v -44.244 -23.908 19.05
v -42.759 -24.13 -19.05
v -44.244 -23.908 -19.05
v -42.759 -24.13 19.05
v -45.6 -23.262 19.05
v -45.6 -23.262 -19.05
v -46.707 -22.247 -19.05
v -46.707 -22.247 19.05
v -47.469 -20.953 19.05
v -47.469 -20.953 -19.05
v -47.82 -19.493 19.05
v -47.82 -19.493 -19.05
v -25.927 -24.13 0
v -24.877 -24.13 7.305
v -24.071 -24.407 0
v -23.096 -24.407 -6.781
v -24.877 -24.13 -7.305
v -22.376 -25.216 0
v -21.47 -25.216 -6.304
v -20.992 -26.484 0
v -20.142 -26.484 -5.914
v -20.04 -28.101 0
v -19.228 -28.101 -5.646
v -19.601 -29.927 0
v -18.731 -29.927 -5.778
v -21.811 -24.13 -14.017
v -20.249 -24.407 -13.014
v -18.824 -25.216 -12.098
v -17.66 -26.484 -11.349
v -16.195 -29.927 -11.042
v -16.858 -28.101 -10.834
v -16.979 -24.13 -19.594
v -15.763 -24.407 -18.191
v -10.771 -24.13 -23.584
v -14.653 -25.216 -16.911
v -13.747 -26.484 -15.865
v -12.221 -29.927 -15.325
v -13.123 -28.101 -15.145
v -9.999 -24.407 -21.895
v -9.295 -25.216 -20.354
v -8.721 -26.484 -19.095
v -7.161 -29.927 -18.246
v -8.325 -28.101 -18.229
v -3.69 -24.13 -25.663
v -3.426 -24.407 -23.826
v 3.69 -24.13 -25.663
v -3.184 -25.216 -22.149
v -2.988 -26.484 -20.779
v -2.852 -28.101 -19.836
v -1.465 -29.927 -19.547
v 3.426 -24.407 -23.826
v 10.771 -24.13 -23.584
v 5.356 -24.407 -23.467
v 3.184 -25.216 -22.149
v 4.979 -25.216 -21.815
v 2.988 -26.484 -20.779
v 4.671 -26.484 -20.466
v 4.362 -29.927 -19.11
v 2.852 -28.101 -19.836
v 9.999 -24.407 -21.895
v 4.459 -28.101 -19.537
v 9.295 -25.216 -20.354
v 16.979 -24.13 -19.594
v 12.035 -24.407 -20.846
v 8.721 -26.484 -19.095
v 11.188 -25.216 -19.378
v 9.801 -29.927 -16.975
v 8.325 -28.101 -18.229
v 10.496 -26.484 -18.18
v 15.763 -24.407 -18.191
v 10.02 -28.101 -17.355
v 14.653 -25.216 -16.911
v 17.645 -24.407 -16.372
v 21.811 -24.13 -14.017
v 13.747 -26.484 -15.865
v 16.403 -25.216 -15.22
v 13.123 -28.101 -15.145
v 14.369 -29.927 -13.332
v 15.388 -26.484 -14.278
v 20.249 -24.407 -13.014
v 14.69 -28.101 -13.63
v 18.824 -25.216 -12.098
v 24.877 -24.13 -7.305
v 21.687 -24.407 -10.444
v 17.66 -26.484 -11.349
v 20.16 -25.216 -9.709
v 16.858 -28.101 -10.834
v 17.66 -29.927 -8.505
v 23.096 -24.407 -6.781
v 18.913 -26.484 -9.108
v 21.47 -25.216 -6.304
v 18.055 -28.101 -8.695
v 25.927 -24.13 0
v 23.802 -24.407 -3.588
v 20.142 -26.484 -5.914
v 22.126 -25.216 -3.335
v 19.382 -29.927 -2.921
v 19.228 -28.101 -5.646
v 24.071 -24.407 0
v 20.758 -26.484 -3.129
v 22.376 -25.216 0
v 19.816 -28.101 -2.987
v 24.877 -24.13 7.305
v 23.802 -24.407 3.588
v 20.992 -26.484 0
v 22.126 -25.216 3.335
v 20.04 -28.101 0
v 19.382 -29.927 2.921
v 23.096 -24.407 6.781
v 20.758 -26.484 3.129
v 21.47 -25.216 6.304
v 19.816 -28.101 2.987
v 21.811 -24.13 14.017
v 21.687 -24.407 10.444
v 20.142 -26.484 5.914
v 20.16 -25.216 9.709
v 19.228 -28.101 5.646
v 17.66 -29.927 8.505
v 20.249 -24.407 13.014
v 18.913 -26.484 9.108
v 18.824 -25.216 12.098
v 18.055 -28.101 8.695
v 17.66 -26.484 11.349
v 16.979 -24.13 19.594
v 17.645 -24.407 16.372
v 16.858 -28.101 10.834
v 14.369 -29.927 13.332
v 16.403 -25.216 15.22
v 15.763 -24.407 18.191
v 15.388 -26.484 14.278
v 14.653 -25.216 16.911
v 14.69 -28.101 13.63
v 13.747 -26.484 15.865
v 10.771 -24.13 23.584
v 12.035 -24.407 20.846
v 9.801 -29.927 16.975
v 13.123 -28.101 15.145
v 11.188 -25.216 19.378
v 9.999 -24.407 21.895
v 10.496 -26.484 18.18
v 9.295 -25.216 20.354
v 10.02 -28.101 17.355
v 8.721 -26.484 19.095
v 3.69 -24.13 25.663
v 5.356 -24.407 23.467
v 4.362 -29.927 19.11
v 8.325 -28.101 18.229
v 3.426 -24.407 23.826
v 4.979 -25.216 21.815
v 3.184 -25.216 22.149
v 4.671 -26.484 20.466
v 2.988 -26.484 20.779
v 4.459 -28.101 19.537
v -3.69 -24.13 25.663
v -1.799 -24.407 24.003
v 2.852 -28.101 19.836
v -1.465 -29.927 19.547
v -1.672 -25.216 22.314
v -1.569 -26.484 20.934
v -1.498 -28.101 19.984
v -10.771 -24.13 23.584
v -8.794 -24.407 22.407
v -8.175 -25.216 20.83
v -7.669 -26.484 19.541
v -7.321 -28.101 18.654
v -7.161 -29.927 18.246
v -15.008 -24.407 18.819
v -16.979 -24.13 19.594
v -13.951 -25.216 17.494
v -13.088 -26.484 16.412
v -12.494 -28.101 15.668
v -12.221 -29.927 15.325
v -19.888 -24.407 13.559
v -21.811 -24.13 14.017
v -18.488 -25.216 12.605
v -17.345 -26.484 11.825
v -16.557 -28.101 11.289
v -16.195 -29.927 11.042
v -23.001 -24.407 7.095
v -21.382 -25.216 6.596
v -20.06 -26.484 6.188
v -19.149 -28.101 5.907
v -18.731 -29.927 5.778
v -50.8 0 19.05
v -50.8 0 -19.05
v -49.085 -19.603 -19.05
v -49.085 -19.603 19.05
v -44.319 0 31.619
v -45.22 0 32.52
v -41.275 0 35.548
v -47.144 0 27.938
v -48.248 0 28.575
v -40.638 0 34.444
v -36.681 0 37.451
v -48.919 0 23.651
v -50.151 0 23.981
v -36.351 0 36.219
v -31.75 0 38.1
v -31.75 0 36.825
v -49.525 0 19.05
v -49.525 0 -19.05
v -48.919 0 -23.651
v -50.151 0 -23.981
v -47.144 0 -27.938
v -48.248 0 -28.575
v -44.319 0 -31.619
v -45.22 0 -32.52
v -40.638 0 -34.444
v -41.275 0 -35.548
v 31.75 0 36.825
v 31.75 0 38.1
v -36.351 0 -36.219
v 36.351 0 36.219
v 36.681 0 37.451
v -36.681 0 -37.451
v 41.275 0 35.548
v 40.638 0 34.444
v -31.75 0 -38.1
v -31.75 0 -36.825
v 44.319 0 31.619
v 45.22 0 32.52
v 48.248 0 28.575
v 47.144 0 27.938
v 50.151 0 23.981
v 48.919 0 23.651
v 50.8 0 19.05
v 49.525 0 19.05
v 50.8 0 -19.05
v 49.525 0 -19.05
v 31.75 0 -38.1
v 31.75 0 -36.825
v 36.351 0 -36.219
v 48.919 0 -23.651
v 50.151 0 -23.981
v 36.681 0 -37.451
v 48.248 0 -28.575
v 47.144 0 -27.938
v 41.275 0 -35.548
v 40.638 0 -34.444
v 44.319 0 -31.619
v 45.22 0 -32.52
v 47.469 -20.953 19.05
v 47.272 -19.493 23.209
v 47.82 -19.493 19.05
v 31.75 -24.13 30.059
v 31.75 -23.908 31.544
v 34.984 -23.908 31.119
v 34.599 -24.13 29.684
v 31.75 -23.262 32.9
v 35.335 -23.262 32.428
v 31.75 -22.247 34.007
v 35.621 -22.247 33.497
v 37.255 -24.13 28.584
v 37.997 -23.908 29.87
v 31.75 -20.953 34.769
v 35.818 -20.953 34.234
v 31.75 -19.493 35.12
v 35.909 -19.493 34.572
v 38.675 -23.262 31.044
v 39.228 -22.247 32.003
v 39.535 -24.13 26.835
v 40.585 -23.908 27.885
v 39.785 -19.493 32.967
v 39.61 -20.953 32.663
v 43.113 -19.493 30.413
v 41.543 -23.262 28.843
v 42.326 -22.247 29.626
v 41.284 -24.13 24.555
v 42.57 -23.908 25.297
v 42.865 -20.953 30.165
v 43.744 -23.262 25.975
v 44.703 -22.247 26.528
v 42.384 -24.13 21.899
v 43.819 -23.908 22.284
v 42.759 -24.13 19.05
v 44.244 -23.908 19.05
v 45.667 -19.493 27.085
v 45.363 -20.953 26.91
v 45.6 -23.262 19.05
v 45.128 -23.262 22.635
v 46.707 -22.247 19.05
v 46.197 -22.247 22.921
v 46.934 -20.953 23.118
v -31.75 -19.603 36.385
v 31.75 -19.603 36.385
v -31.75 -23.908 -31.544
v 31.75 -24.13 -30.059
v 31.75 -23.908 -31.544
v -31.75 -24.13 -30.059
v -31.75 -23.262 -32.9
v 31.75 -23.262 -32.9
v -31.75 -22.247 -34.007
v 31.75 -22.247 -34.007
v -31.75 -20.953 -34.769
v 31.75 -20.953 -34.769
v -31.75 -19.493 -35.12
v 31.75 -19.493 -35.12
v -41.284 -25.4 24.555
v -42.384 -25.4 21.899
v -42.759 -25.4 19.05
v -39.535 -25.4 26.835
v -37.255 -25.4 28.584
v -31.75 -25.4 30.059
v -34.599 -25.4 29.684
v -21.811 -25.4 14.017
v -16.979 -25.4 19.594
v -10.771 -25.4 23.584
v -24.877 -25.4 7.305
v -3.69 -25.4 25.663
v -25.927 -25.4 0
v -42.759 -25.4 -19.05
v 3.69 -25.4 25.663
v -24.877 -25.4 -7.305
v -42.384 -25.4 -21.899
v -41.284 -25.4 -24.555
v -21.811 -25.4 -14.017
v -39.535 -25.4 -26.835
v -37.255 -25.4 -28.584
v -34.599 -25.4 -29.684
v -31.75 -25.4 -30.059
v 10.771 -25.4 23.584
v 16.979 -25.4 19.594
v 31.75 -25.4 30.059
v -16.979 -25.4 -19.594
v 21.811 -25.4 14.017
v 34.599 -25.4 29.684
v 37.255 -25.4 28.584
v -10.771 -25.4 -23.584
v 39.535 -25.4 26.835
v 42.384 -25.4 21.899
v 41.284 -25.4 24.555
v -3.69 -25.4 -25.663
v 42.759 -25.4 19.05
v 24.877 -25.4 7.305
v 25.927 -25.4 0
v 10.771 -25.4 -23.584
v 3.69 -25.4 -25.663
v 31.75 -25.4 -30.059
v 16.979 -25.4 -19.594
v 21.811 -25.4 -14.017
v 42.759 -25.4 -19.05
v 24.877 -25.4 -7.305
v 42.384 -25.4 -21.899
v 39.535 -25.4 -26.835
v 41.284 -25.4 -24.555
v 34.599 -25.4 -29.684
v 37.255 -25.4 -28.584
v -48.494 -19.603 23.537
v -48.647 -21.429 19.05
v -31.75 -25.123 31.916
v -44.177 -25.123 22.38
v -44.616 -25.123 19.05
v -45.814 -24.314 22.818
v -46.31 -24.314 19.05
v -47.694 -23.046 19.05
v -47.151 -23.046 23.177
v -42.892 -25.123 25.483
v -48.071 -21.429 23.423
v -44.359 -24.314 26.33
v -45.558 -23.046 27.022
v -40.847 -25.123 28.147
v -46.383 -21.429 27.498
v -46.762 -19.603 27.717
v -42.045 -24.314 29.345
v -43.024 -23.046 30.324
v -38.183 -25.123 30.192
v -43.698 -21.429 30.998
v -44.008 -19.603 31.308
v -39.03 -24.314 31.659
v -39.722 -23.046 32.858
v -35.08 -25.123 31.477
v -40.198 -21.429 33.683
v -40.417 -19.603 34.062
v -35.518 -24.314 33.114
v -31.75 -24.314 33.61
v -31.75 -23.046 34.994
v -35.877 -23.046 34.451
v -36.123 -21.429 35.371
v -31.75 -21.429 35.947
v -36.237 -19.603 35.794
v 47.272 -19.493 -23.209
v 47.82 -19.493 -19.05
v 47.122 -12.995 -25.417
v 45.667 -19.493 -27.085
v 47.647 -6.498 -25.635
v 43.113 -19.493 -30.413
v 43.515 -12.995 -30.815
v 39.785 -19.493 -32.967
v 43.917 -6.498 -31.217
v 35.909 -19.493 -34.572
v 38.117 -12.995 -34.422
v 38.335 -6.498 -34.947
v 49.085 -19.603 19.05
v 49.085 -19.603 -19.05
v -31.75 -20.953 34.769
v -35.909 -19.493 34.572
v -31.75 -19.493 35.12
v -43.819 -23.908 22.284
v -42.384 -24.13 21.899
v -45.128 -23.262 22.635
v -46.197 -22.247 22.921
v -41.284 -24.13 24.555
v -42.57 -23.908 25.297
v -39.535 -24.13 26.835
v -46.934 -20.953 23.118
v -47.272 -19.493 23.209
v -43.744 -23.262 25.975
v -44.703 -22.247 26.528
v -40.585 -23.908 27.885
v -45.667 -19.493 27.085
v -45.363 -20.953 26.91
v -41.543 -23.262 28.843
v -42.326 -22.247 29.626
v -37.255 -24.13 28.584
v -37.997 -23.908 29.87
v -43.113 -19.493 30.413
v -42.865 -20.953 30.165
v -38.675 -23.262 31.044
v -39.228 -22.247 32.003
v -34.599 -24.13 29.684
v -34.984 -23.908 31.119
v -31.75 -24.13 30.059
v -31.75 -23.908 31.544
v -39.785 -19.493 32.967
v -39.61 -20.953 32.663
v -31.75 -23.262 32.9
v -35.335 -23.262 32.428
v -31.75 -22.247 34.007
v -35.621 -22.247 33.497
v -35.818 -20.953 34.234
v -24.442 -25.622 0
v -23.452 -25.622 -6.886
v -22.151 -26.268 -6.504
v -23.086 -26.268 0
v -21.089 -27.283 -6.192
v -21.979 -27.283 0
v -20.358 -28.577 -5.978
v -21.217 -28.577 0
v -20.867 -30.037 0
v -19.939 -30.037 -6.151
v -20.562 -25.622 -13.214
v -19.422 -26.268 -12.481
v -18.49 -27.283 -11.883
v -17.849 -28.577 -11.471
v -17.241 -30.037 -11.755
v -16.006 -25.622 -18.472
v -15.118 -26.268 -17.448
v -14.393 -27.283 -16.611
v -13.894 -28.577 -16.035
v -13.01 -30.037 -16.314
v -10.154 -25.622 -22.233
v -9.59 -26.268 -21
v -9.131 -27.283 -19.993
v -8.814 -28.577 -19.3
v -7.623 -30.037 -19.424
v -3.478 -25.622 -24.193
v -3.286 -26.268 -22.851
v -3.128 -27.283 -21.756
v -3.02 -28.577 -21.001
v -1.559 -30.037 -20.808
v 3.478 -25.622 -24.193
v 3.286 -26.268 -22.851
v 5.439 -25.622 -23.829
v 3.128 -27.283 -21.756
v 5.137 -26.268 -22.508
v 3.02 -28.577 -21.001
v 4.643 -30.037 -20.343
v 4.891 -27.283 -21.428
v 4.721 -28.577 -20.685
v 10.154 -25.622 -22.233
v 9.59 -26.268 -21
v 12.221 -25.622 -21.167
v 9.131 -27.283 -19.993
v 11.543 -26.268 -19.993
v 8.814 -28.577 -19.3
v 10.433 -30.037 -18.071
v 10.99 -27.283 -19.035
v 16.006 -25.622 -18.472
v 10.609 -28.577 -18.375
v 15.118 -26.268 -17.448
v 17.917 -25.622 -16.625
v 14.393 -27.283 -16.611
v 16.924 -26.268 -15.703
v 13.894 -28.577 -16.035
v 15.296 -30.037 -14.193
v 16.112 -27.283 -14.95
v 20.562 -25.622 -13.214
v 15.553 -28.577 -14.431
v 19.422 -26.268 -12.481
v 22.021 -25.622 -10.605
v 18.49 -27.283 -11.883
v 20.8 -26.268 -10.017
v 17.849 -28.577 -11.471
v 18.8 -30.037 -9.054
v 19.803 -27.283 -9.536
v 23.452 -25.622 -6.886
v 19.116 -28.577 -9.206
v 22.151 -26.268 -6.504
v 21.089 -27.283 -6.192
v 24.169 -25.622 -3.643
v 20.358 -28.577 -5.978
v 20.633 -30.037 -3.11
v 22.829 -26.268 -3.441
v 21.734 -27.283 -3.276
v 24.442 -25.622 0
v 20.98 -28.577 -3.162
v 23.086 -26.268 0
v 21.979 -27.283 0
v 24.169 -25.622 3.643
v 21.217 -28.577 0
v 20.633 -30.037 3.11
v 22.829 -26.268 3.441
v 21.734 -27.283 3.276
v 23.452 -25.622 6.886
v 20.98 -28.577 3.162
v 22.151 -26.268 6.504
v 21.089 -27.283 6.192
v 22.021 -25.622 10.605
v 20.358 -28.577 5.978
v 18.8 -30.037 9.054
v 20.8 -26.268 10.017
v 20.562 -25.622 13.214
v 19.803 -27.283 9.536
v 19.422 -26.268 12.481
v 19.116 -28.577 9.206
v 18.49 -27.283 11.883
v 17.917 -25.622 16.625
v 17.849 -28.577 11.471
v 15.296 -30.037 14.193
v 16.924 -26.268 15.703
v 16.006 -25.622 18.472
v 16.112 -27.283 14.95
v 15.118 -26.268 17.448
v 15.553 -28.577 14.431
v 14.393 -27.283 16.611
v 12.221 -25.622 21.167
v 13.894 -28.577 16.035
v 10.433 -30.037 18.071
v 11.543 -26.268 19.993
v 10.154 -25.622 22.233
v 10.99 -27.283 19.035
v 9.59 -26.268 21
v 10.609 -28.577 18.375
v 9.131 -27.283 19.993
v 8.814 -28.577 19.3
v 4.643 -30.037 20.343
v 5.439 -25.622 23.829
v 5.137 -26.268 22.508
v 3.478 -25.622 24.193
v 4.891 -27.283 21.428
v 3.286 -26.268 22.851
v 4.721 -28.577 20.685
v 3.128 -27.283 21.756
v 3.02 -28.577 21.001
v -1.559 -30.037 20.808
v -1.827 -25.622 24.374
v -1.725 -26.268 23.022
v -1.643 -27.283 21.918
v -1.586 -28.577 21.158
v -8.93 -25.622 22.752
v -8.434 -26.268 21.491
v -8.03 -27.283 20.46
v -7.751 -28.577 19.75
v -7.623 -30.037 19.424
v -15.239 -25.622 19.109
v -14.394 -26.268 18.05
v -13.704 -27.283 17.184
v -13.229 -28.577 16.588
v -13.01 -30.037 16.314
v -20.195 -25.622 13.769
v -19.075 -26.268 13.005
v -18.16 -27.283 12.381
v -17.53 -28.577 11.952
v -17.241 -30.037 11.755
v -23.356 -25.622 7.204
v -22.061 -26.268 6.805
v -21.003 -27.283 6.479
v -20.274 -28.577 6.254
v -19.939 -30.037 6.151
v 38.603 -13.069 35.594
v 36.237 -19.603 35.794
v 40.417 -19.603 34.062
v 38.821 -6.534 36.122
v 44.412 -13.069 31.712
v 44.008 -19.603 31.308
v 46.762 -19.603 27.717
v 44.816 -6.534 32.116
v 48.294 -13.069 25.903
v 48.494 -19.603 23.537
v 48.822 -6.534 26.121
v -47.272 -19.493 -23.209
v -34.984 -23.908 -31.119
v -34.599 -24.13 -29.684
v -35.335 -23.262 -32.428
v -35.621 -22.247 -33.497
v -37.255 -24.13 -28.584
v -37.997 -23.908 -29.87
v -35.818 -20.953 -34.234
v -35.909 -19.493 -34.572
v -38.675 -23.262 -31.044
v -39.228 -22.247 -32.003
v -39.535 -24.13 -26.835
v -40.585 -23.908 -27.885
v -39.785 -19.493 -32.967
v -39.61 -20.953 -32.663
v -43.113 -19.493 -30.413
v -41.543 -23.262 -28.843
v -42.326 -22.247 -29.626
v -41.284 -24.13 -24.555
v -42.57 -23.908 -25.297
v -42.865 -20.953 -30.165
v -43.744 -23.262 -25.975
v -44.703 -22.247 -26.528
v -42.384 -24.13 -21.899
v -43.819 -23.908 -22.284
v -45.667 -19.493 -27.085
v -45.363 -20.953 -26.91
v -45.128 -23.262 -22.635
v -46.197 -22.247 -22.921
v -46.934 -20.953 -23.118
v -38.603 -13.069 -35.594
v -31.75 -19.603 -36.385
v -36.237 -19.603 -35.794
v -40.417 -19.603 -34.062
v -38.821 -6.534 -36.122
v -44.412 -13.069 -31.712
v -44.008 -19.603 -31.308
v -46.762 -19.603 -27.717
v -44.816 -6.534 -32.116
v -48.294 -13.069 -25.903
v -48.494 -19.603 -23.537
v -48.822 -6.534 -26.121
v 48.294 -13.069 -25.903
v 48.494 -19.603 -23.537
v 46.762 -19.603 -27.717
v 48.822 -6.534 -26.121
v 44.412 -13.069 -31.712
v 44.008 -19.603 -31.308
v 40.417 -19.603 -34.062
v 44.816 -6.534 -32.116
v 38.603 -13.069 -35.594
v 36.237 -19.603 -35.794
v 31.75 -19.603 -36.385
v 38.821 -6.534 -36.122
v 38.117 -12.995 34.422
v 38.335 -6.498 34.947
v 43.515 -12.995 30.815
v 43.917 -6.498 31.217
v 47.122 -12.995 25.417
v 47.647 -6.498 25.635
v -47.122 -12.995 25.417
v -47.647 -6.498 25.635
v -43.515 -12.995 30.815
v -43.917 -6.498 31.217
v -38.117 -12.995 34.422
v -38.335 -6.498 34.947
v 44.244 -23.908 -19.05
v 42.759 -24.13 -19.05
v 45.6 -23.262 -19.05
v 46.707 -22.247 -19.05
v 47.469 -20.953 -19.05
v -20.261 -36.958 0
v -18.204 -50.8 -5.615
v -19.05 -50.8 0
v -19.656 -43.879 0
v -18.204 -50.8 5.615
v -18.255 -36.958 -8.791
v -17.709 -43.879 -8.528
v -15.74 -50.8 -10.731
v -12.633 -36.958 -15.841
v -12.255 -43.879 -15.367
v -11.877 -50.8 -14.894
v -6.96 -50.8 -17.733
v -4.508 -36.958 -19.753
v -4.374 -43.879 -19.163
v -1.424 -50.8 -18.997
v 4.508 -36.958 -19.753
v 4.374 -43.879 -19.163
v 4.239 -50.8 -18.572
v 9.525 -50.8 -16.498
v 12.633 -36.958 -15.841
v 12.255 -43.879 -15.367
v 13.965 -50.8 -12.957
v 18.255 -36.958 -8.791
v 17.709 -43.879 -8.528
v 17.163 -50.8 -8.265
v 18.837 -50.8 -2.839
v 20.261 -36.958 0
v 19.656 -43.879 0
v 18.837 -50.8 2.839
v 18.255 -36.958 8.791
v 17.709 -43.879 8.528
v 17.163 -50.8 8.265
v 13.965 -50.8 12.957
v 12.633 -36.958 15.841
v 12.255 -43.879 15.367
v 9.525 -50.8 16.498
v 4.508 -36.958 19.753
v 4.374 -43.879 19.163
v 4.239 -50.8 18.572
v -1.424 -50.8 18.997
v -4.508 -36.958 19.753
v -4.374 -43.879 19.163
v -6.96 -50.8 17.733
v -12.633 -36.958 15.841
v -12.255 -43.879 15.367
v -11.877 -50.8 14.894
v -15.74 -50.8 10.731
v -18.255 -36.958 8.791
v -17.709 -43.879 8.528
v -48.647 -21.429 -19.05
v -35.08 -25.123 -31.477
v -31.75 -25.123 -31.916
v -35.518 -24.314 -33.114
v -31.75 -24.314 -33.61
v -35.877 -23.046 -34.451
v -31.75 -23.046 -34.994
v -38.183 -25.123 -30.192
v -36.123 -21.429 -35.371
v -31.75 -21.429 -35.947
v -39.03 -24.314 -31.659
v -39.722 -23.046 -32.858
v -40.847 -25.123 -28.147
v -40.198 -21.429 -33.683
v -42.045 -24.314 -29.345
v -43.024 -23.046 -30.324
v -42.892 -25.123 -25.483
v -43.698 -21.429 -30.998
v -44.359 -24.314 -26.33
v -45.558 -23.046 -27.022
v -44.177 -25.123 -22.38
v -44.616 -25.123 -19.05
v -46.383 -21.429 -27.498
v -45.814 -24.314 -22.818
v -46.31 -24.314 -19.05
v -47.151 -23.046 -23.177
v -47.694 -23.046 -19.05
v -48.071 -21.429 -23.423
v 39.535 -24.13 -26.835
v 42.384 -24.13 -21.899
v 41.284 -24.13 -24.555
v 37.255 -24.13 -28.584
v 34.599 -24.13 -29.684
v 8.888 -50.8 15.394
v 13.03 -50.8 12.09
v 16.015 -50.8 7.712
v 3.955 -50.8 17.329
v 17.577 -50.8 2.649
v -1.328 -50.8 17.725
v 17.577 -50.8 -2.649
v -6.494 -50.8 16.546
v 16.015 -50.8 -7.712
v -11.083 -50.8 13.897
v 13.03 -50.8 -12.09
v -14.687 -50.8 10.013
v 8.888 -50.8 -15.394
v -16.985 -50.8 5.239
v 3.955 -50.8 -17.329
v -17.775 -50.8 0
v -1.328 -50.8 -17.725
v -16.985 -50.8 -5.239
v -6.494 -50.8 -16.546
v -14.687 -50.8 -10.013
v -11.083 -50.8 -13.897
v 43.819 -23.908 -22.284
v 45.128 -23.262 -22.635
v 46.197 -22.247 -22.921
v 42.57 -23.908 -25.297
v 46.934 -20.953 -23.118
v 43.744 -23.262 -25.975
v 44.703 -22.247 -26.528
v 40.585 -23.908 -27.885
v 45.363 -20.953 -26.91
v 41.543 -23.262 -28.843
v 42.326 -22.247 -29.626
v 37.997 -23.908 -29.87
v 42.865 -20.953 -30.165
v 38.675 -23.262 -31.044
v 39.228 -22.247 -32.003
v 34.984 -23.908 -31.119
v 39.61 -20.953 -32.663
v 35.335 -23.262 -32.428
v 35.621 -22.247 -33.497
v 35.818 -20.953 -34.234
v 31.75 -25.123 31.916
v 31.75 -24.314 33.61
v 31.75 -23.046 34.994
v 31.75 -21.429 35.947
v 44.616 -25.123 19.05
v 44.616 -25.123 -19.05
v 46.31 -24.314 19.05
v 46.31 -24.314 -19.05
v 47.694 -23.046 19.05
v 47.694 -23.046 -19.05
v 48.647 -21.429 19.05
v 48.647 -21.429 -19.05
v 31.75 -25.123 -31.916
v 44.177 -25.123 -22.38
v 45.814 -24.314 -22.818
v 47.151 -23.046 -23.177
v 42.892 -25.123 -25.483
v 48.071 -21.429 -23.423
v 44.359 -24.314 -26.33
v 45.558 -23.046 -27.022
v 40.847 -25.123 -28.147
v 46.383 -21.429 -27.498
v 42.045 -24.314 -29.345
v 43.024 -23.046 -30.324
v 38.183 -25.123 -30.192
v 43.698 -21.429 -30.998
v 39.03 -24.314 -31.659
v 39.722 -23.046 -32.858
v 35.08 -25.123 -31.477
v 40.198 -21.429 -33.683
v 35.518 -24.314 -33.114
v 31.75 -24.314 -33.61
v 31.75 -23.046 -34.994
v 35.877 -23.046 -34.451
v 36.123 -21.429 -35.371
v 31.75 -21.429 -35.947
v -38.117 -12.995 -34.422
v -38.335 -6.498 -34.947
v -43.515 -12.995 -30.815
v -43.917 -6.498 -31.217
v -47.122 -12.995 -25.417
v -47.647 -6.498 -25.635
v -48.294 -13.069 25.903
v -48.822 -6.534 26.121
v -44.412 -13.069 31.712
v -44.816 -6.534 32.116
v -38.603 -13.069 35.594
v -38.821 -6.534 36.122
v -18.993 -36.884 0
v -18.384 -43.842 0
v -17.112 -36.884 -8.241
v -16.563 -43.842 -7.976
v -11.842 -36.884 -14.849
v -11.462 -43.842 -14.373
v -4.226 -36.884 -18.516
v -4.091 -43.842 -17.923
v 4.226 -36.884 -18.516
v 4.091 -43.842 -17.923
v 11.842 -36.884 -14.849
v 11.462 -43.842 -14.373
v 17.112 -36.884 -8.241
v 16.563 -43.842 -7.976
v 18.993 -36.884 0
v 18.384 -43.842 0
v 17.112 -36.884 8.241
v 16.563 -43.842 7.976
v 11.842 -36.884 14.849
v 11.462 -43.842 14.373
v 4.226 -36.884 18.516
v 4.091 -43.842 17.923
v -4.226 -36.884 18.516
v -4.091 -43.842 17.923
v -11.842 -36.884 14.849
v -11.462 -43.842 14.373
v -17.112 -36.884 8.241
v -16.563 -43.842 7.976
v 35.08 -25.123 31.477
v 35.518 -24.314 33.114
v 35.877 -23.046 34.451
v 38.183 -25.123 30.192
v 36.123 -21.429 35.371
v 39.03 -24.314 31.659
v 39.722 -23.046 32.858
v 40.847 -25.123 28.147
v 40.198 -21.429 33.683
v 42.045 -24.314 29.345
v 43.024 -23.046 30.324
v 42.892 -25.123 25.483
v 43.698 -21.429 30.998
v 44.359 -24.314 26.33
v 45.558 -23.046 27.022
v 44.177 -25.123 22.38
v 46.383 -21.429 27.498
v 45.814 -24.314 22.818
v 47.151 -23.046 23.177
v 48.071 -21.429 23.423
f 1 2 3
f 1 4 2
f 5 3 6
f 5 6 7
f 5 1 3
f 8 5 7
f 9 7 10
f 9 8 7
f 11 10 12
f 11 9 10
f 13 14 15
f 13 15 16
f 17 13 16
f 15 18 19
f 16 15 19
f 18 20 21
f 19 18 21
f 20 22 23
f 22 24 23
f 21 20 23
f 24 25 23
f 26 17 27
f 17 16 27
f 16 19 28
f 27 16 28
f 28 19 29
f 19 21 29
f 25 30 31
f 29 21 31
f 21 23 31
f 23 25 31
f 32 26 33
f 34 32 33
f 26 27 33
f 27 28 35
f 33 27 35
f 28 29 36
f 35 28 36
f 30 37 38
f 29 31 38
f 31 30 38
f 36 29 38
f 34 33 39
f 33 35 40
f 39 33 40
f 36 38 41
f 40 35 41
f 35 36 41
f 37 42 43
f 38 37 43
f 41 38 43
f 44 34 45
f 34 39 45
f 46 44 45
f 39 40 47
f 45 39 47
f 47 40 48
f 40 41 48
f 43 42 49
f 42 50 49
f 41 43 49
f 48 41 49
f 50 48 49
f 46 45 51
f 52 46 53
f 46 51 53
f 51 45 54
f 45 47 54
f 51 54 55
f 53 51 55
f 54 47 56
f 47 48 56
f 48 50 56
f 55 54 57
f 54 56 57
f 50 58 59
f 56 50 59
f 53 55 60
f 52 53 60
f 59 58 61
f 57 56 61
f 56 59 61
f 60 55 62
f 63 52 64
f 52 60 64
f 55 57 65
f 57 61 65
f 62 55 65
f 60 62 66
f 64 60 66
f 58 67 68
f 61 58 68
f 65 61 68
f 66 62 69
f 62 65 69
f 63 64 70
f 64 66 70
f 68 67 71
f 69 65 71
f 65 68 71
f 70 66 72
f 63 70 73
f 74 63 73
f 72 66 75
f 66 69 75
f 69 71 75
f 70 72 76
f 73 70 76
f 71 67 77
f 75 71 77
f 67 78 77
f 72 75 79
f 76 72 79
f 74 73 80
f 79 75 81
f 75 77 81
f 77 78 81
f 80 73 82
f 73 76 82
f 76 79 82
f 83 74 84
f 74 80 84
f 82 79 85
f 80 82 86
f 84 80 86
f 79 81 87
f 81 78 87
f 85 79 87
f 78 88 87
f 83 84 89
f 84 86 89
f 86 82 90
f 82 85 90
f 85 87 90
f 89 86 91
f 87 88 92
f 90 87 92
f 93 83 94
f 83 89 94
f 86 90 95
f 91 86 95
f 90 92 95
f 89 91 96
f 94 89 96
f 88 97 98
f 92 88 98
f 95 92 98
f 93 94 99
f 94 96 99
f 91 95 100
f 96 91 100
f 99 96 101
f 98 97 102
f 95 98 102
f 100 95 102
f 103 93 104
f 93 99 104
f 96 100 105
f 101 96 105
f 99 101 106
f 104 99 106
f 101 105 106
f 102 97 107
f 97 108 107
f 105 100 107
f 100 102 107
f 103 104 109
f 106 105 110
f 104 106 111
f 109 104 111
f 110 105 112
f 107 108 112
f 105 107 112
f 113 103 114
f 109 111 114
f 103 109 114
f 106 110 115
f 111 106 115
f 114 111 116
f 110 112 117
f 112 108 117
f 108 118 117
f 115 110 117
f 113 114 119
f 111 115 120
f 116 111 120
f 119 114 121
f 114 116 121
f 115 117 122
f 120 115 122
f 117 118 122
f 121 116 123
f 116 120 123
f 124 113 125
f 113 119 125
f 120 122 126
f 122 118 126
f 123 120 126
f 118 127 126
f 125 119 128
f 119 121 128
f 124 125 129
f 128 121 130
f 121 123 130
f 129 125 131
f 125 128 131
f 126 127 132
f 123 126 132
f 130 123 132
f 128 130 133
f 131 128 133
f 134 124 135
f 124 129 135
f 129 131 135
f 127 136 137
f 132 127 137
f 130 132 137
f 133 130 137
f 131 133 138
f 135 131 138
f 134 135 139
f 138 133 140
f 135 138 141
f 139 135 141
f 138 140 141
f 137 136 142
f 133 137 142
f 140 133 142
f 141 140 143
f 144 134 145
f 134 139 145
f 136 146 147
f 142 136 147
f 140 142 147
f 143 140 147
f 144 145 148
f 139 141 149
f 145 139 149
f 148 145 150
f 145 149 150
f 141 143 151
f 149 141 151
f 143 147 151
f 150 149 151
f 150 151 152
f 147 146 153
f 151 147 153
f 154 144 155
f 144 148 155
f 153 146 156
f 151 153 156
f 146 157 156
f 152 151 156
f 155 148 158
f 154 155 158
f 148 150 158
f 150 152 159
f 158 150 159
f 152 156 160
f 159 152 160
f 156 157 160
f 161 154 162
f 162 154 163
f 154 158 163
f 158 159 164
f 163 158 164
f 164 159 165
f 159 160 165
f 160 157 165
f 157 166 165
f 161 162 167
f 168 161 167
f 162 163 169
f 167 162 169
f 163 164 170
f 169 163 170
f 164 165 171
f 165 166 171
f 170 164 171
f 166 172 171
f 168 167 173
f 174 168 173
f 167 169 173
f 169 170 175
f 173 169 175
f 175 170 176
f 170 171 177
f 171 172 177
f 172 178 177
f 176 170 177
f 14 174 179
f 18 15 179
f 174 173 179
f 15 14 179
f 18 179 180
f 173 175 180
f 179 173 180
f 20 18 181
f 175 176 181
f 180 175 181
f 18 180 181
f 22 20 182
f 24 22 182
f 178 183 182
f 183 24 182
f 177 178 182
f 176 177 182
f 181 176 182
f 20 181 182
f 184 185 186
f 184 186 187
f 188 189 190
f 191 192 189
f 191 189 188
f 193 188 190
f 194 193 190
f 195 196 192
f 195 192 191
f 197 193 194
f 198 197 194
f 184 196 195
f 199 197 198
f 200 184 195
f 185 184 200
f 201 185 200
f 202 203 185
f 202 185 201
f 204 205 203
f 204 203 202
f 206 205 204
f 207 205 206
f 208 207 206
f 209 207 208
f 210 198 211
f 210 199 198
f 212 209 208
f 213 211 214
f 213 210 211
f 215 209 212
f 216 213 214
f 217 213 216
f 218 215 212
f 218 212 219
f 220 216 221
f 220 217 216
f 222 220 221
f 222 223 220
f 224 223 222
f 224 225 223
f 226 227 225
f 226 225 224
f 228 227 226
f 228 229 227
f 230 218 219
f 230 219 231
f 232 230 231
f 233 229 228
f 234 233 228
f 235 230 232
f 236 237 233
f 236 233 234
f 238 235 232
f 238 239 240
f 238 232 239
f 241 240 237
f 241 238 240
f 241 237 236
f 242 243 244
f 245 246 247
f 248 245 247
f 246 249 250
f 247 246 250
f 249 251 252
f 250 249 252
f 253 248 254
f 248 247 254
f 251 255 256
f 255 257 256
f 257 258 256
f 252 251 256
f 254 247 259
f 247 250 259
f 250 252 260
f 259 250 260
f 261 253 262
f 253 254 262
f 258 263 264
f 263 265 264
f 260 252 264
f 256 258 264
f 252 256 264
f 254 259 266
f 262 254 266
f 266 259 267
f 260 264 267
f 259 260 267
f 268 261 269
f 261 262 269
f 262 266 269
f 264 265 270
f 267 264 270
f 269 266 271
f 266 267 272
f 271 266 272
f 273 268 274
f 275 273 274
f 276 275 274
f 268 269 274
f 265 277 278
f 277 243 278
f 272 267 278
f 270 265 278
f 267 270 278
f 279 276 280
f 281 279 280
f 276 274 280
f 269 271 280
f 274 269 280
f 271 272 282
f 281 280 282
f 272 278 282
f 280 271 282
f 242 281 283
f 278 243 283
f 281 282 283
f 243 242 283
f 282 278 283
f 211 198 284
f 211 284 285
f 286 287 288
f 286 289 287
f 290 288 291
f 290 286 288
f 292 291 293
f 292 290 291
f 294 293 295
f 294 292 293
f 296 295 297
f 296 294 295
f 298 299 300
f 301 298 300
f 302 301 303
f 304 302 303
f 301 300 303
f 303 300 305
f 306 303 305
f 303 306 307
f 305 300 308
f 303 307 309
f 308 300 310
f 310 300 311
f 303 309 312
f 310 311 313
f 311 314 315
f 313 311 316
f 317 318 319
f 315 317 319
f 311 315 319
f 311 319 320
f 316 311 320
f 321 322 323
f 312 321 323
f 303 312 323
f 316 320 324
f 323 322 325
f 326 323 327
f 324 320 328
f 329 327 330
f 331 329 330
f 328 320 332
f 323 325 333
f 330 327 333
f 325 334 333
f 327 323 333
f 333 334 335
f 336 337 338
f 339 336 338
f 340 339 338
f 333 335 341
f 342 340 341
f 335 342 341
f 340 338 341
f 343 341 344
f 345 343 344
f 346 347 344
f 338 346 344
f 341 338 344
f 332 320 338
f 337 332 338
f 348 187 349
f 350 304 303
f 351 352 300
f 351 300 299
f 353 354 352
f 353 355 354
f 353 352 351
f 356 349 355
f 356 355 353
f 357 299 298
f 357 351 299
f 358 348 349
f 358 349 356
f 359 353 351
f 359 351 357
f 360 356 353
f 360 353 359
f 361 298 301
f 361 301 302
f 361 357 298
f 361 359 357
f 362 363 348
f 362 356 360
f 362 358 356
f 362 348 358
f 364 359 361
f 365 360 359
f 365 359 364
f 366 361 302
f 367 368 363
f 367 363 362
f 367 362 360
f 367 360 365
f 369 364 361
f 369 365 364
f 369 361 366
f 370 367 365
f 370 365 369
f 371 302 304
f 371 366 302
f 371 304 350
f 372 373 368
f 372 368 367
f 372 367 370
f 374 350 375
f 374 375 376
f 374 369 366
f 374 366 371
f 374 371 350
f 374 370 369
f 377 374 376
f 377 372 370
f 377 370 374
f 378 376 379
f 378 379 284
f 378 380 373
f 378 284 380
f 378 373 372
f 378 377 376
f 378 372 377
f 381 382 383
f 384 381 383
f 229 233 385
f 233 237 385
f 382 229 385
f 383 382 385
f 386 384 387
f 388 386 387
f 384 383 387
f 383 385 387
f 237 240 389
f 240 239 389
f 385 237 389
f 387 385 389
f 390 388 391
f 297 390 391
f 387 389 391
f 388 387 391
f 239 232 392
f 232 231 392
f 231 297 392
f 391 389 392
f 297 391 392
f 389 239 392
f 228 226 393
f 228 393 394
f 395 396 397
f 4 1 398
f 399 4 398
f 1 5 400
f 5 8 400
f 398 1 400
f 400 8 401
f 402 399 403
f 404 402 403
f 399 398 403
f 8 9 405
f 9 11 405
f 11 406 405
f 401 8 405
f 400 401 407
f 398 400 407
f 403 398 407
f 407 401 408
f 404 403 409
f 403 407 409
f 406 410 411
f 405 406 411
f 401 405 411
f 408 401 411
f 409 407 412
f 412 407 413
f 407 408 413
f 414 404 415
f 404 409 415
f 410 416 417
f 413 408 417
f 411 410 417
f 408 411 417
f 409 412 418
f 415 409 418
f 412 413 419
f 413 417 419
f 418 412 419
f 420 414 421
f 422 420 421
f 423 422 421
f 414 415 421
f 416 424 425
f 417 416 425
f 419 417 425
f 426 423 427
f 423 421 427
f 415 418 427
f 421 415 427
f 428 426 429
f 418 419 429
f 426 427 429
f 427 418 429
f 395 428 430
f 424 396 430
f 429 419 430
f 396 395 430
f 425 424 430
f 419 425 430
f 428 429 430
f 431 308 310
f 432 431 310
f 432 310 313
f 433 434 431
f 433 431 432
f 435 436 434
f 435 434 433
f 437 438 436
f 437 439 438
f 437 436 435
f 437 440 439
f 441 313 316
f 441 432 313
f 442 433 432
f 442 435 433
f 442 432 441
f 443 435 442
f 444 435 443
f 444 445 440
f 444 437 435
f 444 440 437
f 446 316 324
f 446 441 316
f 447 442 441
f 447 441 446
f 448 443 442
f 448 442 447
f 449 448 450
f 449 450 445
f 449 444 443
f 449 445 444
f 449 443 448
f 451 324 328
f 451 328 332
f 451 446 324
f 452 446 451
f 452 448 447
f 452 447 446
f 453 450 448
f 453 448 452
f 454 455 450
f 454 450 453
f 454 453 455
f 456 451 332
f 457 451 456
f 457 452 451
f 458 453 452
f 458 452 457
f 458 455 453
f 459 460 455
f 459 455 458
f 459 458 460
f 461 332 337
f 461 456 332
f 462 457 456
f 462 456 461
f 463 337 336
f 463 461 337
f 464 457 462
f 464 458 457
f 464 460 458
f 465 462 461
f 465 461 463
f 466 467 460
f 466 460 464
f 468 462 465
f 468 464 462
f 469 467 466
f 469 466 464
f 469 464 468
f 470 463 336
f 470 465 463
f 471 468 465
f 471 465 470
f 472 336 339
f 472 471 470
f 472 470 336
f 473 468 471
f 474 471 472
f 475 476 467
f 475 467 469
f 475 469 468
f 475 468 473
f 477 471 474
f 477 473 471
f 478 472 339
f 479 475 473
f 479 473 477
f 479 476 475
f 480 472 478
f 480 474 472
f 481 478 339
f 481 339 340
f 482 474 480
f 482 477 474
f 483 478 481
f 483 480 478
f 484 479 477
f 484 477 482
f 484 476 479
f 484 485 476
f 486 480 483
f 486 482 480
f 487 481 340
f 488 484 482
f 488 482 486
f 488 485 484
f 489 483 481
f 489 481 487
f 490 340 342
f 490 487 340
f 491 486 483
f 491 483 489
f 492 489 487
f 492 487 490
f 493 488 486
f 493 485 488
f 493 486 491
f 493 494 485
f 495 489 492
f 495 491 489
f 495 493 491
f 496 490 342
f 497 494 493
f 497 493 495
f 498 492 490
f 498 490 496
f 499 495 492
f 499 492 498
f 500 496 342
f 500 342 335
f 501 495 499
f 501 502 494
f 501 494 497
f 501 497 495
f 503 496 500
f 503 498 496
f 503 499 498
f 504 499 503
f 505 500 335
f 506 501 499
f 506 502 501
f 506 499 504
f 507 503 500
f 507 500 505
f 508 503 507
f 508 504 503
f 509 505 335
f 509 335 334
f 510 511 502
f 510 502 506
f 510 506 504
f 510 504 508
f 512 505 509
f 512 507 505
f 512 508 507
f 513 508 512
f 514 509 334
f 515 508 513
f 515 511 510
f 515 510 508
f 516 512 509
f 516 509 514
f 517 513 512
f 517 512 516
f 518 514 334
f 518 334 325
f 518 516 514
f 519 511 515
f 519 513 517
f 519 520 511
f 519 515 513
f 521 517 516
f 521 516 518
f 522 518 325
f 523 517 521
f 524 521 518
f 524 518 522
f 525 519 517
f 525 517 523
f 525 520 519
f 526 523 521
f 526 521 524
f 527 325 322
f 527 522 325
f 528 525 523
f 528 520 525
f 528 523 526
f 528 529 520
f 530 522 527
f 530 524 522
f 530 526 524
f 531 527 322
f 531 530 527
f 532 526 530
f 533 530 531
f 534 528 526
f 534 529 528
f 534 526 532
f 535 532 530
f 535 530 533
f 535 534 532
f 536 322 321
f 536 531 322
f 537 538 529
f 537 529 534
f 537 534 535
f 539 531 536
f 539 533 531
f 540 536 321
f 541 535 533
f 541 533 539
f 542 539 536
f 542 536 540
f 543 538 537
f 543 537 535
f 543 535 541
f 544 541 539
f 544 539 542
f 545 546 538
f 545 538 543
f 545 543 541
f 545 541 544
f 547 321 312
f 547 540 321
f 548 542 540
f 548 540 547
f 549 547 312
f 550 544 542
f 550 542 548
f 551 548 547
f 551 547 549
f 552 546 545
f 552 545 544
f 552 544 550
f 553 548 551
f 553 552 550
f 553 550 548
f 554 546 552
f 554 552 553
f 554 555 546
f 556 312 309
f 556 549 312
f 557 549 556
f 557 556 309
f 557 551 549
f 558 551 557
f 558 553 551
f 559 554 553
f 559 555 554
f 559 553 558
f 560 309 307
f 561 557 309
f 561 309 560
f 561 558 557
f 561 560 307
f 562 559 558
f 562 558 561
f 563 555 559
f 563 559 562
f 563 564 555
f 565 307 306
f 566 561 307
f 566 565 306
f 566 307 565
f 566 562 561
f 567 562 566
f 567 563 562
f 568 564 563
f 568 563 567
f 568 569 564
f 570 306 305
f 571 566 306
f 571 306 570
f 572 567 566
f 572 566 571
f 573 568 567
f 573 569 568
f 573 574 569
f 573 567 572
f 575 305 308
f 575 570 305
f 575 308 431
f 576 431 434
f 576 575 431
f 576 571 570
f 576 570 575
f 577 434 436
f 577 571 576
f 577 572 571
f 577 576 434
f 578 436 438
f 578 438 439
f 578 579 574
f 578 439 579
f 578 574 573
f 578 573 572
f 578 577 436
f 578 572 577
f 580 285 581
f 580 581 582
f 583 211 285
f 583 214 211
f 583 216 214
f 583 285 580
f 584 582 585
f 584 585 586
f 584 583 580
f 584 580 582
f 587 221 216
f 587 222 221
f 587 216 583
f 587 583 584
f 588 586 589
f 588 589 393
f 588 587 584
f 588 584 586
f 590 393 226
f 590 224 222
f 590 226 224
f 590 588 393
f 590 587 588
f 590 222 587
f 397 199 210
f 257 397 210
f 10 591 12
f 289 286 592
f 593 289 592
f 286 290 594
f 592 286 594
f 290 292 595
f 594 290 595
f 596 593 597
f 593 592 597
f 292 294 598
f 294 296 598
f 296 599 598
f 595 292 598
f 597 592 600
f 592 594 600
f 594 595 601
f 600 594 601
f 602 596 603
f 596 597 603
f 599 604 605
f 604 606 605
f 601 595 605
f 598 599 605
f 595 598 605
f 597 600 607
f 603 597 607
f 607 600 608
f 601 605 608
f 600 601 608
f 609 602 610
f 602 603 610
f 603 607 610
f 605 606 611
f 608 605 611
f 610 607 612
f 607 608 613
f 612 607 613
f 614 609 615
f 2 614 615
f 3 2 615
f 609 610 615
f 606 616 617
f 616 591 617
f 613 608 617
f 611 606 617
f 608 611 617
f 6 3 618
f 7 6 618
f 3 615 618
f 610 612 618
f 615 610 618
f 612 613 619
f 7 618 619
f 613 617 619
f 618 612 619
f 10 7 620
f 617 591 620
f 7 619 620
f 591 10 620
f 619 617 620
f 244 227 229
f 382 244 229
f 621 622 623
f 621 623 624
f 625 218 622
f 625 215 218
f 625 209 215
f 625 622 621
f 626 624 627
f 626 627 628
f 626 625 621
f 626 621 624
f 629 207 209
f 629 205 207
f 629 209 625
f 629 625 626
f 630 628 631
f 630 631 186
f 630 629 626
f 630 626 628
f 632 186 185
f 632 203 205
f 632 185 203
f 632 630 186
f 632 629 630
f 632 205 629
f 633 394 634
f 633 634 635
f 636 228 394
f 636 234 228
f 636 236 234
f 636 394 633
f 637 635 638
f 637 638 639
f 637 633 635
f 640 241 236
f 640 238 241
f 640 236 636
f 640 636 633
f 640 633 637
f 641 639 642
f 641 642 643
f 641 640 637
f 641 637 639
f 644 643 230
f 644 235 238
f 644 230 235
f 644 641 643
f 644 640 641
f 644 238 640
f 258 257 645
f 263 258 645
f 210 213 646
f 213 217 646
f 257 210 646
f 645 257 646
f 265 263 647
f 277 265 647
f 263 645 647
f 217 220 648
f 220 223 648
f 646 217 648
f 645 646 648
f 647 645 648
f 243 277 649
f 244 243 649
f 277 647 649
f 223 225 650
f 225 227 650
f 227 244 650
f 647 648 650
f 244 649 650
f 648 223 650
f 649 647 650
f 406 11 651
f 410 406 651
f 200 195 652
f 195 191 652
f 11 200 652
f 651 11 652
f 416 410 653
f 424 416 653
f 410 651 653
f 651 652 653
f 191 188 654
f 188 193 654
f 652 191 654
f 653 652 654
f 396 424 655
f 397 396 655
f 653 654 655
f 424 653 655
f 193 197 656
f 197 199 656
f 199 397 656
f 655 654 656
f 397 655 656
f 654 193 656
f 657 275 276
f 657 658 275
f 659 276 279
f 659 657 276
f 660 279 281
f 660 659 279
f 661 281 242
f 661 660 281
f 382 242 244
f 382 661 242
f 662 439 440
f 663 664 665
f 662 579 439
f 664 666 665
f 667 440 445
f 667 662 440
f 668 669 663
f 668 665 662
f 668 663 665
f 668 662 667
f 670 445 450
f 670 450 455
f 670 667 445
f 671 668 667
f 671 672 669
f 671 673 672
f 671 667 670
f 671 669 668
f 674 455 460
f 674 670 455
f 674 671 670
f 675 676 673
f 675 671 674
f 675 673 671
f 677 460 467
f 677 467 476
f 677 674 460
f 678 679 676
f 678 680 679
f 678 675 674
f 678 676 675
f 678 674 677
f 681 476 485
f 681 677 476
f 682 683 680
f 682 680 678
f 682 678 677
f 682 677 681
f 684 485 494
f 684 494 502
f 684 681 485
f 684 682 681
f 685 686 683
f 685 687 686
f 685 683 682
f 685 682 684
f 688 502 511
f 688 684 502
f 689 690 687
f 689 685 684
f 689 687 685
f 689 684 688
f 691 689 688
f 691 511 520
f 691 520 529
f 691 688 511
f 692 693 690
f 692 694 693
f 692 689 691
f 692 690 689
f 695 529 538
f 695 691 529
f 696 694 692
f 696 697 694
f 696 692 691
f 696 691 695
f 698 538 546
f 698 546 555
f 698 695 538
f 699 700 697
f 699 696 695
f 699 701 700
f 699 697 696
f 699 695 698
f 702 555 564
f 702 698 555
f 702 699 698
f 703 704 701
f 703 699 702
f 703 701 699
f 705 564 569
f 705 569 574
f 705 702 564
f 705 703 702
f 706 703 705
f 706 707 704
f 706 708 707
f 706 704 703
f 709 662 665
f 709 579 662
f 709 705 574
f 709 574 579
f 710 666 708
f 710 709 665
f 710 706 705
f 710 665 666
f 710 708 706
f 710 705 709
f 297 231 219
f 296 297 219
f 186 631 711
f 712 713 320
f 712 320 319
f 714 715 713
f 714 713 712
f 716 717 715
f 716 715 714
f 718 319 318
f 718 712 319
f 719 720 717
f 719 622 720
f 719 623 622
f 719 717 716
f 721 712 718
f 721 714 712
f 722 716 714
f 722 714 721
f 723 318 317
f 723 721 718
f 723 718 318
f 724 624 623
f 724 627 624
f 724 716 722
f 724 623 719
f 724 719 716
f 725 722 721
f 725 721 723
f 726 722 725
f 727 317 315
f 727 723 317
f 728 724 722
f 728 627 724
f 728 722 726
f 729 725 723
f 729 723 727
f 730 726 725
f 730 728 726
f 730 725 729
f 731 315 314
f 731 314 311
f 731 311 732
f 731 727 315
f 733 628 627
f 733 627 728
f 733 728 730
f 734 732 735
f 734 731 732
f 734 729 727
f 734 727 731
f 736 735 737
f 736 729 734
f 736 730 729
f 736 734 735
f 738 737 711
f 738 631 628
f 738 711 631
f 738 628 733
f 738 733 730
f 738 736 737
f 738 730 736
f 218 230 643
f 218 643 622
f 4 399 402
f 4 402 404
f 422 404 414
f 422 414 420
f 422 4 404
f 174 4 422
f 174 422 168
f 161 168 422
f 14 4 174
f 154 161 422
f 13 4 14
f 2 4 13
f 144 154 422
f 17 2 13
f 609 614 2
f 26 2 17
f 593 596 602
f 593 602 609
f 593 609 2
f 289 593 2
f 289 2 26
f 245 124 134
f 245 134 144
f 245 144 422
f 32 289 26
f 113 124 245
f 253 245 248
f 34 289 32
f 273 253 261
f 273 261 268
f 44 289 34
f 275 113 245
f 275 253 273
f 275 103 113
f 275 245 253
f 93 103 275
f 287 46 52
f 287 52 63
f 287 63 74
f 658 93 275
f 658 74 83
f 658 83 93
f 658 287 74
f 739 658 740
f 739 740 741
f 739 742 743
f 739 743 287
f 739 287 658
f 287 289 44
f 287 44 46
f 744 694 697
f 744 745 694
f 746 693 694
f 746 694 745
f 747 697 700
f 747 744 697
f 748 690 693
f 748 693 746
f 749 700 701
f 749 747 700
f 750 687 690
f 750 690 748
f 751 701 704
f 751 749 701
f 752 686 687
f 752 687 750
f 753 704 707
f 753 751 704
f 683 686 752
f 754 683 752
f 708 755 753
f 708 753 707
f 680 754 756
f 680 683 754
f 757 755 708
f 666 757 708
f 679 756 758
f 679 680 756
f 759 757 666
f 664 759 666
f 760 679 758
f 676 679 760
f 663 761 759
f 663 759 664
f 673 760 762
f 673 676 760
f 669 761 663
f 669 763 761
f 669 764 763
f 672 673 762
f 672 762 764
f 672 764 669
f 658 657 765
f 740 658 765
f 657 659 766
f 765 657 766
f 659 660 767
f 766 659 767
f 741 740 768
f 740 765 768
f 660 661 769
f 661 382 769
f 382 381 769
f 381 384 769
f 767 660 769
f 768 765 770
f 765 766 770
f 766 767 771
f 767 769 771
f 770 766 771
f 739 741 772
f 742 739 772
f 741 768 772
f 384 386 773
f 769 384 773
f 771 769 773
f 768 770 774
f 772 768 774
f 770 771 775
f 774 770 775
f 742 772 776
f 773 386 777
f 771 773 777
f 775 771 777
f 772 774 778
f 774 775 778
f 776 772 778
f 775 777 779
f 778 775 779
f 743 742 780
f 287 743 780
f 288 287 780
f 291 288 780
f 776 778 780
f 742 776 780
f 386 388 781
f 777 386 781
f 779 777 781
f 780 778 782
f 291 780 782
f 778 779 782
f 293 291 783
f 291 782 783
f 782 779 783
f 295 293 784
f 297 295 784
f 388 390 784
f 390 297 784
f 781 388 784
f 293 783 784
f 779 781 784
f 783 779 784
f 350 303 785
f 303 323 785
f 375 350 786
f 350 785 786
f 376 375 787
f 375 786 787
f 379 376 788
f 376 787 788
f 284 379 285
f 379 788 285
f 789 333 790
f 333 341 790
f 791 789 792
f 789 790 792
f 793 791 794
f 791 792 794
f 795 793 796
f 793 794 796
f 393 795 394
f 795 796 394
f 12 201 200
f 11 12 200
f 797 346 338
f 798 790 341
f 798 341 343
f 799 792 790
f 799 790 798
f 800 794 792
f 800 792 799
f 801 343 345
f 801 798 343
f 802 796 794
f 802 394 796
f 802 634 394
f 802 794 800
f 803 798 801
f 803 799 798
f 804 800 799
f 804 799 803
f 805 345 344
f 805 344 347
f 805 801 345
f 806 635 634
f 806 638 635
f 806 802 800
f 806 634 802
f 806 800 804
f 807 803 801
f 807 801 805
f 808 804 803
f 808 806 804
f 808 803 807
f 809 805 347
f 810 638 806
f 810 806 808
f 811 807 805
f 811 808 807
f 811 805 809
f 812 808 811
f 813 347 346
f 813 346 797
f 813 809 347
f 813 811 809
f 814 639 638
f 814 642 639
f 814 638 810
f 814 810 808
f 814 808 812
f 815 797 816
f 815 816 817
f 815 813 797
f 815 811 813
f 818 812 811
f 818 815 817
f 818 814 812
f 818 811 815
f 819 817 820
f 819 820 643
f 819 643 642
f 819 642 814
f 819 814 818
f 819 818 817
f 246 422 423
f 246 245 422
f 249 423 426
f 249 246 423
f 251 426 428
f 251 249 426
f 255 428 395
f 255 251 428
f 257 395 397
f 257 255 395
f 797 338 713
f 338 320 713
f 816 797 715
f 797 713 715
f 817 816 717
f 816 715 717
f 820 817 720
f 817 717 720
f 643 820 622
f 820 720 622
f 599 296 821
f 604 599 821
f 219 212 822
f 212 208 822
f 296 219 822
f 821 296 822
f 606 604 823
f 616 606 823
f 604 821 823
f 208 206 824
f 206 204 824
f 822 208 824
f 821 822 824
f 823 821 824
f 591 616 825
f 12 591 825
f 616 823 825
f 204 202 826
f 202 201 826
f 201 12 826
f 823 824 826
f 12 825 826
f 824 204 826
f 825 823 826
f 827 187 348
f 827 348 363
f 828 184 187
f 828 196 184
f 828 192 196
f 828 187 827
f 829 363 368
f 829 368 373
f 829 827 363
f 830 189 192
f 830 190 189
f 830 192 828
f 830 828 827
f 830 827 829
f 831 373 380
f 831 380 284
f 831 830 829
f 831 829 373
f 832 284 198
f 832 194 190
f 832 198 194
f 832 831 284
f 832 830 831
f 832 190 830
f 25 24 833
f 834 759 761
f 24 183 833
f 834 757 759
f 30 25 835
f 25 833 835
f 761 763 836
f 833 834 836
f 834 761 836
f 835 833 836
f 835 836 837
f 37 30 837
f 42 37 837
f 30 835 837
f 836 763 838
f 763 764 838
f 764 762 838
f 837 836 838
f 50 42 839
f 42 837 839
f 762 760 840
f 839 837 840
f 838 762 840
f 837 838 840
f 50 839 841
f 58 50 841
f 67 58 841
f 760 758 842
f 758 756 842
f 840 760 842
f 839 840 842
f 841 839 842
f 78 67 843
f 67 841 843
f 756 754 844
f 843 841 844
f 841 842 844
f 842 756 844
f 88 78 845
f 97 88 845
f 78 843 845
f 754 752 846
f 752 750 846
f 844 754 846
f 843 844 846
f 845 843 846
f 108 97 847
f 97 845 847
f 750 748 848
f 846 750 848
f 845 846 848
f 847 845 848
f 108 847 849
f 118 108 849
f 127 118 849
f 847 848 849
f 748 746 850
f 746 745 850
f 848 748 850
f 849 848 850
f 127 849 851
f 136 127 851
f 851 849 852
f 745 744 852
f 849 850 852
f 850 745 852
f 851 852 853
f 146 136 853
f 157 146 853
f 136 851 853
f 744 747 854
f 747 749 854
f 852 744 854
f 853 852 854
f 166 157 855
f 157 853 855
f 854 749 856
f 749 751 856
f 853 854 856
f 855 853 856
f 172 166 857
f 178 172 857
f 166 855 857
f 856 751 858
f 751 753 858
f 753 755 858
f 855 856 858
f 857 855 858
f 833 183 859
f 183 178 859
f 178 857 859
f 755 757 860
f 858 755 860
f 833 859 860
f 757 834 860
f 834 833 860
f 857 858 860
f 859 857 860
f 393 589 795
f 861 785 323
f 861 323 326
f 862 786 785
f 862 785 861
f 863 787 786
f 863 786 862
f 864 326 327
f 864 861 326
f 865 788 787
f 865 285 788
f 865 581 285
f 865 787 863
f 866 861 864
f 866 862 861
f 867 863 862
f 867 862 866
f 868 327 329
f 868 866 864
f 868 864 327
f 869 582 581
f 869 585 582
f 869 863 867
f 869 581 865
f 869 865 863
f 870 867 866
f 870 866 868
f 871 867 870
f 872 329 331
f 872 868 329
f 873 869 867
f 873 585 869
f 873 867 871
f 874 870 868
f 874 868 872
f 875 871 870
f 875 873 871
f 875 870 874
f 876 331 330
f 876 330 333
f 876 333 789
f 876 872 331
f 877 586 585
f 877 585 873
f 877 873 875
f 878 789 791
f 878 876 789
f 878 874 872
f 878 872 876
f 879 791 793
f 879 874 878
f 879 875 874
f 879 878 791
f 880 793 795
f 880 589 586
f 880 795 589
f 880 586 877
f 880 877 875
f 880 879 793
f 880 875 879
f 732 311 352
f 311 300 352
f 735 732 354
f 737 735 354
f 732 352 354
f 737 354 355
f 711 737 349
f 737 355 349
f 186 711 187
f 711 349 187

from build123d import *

# Parameters (mm, degrees)
BOSS_EXTRUDE1_DEPTH = 25.4
BOSS_EXTRUDE1_DRAFT = -5
BOSS_EXTRUDE2_REACH = 83.32
SKETCH3_R           = 19.05
BOSS_EXTRUDE2_DRAFT = 5
FILLET1_R           = 5.08
FILLET2_R           = 6.35
SHELL1_T            = -1.27


with BuildPart() as part:
    # Sketch1 → Boss-Extrude1 (with draft: the straight prism first)
    with BuildSketch(Plane(origin=(0, 0, 0), x_dir=(1, 0, 0), z_dir=(0, 1, 0))):
        with BuildLine():
            ThreePointArc((31.75, -38.1), (45.220384182, -32.520384182), (50.8, -19.05))
            Line((50.8, -19.05), (50.8, 19.05))
            ThreePointArc((50.8, 19.05), (45.220384182, 32.520384182), (31.75, 38.1))
            Line((31.75, 38.1), (-31.75, 38.1))
            ThreePointArc((-31.75, 38.1), (-45.220384182, 32.520384182), (-50.8, 19.05))
            Line((-50.8, 19.05), (-50.8, -19.05))
            ThreePointArc((-50.8, -19.05), (-45.220384182, -32.520384182), (-31.75, -38.1))
            Line((-31.75, -38.1), (31.75, -38.1))
        make_face()
    extrude(amount=-BOSS_EXTRUDE1_DEPTH)
    # Boss-Extrude1: the draft: its side faces are tilted about the plane it starts from
    boss_extrude1_sides = [part.faces().sort_by_distance(p)[0] for p in [
        (45.220384182, -12.7, 32.520384182),
        (50.8, -12.7, 0),
        (45.220384182, -12.7, -32.520384182),
        (0, -12.7, -38.1),
        (-45.220384182, -12.7, -32.520384182),
        (-50.8, -12.7, 0),
        (-45.220384182, -12.7, 32.520384182),
        (0, -12.7, 38.1),
    ]]
    draft(boss_extrude1_sides, Plane(origin=(0, 0, 0), x_dir=(1, 0, 0), z_dir=(0, 1, 0)), BOSS_EXTRUDE1_DRAFT)




with BuildPart() as boss_extrude2_long_prism_1:
    # Sketch3 → Boss-Extrude2 (the long prism of profile 1, to be tilted and cut off)
    with BuildSketch(Plane(origin=(0, -50.8, 0), x_dir=(-1, 0, 0), z_dir=(0, -1, 0))):
        Circle(SKETCH3_R)
    extrude(amount=-BOSS_EXTRUDE2_REACH)
    boss_extrude2_tool1_sides = [boss_extrude2_long_prism_1.faces().sort_by_distance(p)[0] for p in [
        (19.05, -9.14, 0),
    ]]
    draft(boss_extrude2_tool1_sides, Plane(origin=(0, -50.8, 0), x_dir=(-1, 0, 0), z_dir=(0, -1, 0)), BOSS_EXTRUDE2_DRAFT)  # the draft: side faces tilted about the start plane


with BuildPart() as part_1:
    add(part.part)
    boss_extrude2_tool1 = boss_extrude2_long_prism_1.part - part.part
    add(boss_extrude2_tool1.solids().sort_by_distance((0, -50.8, 0))[0])

    # Fillet1
    fillet1_edges = [part_1.edges().sort_by_distance(p)[0] for p in [
        (21.272212054, -25.4, 0),
    ]]
    fillet(fillet1_edges, radius=FILLET1_R)

    # Fillet2
    fillet2_edges = [part_1.edges().sort_by_distance(p)[0] for p in [
        (-43.649042969, -25.4, 30.949042969),
        (0, -25.4, 35.877787946),
        (43.649042969, -25.4, 30.949042969),
        (48.577787946, -25.4, 0),
        (43.649042969, -25.4, -30.949042969),
        (0, -25.4, -35.877787946),
        (-43.649042969, -25.4, -30.949042969),
        (-48.577787946, -25.4, 0),
    ]]
    fillet(fillet2_edges, radius=FILLET2_R)

    # Shell1
    shell1_openings = [part_1.faces().sort_by_distance(p)[0] for p in [
        (0, -50.8, 0),
        (0, 0, 0),
    ]]
    offset(amount=SHELL1_T, openings=shell1_openings, kind=Kind.INTERSECTION)


solid = part_1.part
